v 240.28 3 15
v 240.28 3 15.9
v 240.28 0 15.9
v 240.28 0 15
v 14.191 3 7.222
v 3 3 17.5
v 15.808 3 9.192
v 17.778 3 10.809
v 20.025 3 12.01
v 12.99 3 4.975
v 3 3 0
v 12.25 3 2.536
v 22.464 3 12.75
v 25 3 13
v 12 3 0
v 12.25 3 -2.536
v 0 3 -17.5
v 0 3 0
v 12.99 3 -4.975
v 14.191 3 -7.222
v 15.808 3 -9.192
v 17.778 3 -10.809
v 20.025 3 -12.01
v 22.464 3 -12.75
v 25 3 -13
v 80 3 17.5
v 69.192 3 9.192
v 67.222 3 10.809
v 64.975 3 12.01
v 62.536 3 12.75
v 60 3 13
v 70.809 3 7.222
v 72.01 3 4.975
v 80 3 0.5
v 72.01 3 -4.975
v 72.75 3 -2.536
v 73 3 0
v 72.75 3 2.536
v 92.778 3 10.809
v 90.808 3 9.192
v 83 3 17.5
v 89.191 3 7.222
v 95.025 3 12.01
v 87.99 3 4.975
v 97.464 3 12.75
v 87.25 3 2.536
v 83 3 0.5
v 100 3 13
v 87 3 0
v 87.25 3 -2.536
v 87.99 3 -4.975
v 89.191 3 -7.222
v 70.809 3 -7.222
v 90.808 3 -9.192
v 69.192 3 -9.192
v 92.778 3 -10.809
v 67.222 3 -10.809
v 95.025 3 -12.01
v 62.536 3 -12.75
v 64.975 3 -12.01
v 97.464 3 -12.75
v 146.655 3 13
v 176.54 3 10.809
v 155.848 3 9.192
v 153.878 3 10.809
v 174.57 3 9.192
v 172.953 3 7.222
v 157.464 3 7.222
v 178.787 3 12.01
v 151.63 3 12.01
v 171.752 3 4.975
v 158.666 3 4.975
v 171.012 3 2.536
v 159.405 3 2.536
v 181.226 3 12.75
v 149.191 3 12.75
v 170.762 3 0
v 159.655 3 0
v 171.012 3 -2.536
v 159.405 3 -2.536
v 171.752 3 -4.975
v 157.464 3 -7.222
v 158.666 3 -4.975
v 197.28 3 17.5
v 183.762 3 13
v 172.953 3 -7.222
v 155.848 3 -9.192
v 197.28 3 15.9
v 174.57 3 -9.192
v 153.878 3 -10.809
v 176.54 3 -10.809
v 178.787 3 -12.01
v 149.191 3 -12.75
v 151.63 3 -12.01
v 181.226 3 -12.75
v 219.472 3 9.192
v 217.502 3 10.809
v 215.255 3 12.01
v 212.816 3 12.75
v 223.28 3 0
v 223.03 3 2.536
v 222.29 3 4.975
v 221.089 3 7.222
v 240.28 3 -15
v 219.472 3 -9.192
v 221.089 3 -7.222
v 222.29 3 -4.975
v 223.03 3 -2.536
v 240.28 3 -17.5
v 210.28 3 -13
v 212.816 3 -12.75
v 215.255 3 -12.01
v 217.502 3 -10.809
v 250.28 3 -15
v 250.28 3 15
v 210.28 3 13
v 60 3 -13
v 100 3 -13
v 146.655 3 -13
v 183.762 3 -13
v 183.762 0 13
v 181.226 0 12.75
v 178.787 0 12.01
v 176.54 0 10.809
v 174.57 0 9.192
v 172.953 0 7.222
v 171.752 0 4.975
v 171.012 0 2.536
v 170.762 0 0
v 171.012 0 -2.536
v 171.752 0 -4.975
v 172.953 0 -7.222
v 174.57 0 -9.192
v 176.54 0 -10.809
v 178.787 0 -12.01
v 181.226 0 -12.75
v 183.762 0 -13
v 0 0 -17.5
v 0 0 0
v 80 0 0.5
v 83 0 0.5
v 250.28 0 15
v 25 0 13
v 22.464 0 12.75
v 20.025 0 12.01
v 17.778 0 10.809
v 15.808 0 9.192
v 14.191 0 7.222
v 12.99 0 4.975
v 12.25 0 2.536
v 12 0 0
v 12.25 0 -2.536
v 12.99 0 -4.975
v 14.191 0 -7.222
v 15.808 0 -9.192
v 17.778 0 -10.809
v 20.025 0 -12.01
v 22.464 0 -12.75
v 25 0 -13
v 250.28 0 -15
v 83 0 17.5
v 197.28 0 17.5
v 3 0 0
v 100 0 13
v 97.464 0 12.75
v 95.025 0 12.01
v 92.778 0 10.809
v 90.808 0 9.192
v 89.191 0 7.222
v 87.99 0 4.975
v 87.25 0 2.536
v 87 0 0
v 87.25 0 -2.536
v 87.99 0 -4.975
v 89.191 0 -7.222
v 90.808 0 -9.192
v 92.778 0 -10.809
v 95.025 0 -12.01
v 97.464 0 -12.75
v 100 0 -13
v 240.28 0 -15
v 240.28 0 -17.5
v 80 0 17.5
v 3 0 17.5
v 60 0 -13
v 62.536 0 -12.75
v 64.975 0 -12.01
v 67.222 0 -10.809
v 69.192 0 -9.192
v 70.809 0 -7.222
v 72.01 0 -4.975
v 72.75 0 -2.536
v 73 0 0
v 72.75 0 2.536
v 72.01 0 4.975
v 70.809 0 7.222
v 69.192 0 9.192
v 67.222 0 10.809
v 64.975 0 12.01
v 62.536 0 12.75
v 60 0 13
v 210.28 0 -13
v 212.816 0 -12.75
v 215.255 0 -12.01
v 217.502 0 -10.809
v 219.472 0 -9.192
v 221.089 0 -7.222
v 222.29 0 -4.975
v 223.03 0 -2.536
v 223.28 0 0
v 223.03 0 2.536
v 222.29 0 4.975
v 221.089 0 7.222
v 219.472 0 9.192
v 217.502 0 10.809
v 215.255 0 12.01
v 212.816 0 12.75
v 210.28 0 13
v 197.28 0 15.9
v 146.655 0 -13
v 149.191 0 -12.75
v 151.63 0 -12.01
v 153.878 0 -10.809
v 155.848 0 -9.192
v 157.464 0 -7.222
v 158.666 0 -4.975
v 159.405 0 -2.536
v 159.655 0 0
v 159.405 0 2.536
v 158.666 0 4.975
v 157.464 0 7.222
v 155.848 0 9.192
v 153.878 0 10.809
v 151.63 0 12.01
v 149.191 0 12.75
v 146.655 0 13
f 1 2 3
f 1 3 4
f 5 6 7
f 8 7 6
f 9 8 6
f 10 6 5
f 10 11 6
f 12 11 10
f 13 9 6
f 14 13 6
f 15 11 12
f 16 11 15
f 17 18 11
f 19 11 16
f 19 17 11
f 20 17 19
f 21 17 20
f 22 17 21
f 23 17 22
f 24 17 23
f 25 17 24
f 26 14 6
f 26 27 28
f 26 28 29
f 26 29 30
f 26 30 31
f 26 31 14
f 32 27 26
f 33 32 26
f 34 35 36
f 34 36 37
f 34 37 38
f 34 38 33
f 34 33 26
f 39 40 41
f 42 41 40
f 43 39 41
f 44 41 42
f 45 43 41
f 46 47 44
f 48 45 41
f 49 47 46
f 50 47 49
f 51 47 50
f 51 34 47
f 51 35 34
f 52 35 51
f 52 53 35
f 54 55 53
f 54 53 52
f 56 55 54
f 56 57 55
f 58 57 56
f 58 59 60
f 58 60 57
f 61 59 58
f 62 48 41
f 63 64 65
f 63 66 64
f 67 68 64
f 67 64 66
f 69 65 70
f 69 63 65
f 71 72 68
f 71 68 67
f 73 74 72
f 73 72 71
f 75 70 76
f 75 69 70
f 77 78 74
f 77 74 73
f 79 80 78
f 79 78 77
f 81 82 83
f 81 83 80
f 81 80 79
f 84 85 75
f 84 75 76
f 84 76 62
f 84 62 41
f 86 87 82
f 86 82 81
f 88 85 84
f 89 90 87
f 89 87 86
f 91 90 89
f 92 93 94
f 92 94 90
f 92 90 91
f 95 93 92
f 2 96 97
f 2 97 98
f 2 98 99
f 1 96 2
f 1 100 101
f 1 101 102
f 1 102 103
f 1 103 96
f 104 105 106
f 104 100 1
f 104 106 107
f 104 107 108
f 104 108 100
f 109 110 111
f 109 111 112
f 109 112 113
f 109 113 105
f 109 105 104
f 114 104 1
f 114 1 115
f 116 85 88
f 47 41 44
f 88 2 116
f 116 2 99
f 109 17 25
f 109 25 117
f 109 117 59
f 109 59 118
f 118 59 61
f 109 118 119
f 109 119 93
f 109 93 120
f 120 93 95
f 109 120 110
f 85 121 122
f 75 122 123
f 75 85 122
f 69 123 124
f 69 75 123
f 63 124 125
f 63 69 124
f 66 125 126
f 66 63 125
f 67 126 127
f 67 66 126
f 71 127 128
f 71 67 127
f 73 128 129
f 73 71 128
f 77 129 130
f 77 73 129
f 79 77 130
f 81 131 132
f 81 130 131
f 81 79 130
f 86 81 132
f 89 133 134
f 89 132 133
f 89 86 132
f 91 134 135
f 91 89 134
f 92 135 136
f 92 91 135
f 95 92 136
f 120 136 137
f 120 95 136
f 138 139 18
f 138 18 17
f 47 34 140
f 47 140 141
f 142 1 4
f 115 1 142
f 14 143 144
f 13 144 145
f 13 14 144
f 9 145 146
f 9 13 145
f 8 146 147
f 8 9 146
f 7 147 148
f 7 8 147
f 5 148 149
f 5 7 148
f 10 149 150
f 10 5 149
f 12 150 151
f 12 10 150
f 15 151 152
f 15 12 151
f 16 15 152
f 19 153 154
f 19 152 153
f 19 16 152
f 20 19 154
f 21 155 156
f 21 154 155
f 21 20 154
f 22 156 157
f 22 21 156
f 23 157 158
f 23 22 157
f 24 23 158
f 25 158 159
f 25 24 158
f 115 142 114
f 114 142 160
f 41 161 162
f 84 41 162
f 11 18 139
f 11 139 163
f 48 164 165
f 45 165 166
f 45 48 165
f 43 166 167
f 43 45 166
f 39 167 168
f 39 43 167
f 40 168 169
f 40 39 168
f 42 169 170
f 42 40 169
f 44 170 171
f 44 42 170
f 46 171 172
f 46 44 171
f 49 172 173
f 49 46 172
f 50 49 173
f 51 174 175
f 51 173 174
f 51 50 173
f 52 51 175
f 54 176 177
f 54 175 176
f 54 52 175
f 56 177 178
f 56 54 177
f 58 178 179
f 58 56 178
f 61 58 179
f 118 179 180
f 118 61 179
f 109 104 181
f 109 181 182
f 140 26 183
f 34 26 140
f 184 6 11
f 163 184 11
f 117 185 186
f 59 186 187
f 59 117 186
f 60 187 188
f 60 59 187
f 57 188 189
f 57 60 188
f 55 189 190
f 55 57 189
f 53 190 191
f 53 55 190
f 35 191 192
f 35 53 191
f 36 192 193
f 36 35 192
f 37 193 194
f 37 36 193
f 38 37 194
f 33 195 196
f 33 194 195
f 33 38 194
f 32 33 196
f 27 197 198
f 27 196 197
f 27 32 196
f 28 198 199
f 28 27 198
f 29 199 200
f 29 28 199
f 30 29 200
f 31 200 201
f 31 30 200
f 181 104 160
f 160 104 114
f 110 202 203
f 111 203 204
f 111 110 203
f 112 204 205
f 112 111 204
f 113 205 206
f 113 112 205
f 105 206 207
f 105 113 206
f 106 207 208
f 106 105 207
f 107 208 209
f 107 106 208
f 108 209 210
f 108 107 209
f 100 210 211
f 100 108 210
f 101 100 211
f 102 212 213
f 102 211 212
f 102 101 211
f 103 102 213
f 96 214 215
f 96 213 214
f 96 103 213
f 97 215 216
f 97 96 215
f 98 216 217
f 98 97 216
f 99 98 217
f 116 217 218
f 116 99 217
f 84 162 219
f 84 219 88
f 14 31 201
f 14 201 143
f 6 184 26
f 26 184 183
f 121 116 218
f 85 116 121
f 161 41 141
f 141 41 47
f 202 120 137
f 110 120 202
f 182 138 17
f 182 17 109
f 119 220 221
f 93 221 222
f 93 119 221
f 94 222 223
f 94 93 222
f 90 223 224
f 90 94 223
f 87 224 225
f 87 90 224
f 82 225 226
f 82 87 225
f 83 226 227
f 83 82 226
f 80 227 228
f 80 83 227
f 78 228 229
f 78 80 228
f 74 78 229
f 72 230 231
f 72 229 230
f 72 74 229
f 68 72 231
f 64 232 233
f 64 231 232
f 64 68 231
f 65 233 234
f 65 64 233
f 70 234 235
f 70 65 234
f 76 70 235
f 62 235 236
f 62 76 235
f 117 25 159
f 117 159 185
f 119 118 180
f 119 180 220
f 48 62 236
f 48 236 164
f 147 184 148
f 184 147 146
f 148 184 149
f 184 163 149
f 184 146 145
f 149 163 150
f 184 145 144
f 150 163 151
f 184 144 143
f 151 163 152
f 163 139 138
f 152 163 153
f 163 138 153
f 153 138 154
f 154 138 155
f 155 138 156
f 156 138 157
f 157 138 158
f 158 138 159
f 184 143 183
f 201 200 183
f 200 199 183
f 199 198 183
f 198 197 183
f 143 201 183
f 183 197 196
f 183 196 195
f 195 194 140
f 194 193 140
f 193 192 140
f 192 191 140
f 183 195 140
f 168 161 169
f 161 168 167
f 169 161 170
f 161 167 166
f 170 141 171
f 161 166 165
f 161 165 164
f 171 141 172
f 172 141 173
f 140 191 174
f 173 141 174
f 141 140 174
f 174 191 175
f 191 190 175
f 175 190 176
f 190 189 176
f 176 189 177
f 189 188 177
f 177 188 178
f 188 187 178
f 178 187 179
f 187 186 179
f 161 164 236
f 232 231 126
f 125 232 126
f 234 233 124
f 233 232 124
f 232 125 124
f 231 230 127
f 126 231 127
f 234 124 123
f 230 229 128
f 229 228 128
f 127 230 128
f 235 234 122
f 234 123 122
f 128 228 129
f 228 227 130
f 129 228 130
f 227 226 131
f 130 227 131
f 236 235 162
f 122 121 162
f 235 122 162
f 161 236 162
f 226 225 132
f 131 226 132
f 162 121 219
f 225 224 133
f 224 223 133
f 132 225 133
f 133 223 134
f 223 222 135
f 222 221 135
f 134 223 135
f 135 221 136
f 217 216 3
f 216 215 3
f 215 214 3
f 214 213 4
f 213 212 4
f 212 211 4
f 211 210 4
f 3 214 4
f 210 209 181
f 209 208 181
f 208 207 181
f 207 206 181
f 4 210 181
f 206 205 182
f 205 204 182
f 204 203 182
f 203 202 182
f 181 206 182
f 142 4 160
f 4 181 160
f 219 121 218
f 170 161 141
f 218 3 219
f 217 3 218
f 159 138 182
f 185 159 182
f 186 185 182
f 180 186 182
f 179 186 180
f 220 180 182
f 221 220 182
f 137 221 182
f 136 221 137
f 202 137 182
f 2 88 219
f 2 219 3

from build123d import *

# Parameters (mm, degrees)
SKETCH1_W               = 250.28
SKETCH1_H               = 35
BOSS_EXTRUDE1_DEPTH     = 3
SKETCH2_W               = 3
SKETCH2_H               = 17
CUT_EXTRUDE1_DEPTH      = 1
CUT_EXTRUDE1_DEPTH_BACK = 4
CUT_EXTRUDE3_DEPTH      = 4
SKETCH5_W               = 10
SKETCH5_H               = 2.5
CUT_EXTRUDE4_DEPTH      = 3
SKETCH6_W               = 3
SKETCH6_H               = 17.5
CUT_EXTRUDE5_DEPTH      = 10
SKETCH7_W               = 43
SKETCH7_H               = 3
CUT_EXTRUDE6_DEPTH      = 1.6


with BuildPart() as part:
    # Sketch1 → Boss-Extrude1 (new body)
    with BuildSketch(Plane(origin=(0, 0, 0), x_dir=(1, 0, 0), z_dir=(0, 1, 0))):
        with Locations((125.14, 0)):
            Rectangle(SKETCH1_W, SKETCH1_H)
    extrude(amount=BOSS_EXTRUDE1_DEPTH)

    # Sketch2 → Cut-Extrude1 (cut, two sides)
    with BuildSketch(Plane(origin=(0, 3, 0), x_dir=(1, 0, 0), z_dir=(0, 1, 0))) as cut_extrude1_sk:
        with Locations((81.5, -9)):
            Rectangle(SKETCH2_W, SKETCH2_H)
    extrude(amount=CUT_EXTRUDE1_DEPTH, mode=Mode.SUBTRACT)
    extrude(cut_extrude1_sk.sketch, amount=-CUT_EXTRUDE1_DEPTH_BACK, mode=Mode.SUBTRACT)

    # Sketch4 → Cut-Extrude3 (cut, through all)
    with BuildSketch(Plane(origin=(0, 3, 0), x_dir=(1, 0, 0), z_dir=(0, 1, 0))):
        with BuildLine():
            Line((183.762367309, 13), (210.28, 13))
            ThreePointArc((210.28, 13), (223.28, 0), (210.28, -13))
            Line((210.28, -13), (183.762367309, -13))
            ThreePointArc((183.762367309, -13), (170.762367309, 0), (183.762367309, 13))
        make_face()
        with BuildLine():
            Line((25, 13), (60, 13))
            ThreePointArc((60, 13), (73, 0), (60, -13))
            Line((60, -13), (25, -13))
            ThreePointArc((25, -13), (12, 0), (25, 13))
        make_face()
        with BuildLine():
            Line((100, 13), (146.655192757, 13))
            ThreePointArc((146.655192757, 13), (159.655192757, 0), (146.655192757, -13))
            Line((146.655192757, -13), (100, -13))
            ThreePointArc((100, -13), (87, 0), (100, 13))
        make_face()
    extrude(amount=-CUT_EXTRUDE3_DEPTH, mode=Mode.SUBTRACT)

    # Sketch5 → Cut-Extrude4 (cut)
    with BuildSketch(Plane(origin=(0, 3, 0), x_dir=(1, 0, 0), z_dir=(0, 1, 0))):
        with Locations((245.28, 16.25)):
            Rectangle(SKETCH5_W, SKETCH5_H)
        with Locations((245.28, -16.25)):
            Rectangle(SKETCH5_W, SKETCH5_H)
    extrude(amount=-CUT_EXTRUDE4_DEPTH, mode=Mode.SUBTRACT)

    # Sketch6 → Cut-Extrude5 (cut)
    with BuildSketch(Plane(origin=(0, 3, 0), x_dir=(1, 0, 0), z_dir=(0, 1, 0))):
        with Locations((1.5, -8.75)):
            Rectangle(SKETCH6_W, SKETCH6_H)
    extrude(amount=-CUT_EXTRUDE5_DEPTH, mode=Mode.SUBTRACT)

    # Sketch7 → Cut-Extrude6 (cut)
    with BuildSketch(Plane.XY.offset(17.5)):
        with Locations((218.78, 1.5)):
            Rectangle(SKETCH7_W, SKETCH7_H)
    extrude(amount=-CUT_EXTRUDE6_DEPTH, mode=Mode.SUBTRACT)


solid = part.part
